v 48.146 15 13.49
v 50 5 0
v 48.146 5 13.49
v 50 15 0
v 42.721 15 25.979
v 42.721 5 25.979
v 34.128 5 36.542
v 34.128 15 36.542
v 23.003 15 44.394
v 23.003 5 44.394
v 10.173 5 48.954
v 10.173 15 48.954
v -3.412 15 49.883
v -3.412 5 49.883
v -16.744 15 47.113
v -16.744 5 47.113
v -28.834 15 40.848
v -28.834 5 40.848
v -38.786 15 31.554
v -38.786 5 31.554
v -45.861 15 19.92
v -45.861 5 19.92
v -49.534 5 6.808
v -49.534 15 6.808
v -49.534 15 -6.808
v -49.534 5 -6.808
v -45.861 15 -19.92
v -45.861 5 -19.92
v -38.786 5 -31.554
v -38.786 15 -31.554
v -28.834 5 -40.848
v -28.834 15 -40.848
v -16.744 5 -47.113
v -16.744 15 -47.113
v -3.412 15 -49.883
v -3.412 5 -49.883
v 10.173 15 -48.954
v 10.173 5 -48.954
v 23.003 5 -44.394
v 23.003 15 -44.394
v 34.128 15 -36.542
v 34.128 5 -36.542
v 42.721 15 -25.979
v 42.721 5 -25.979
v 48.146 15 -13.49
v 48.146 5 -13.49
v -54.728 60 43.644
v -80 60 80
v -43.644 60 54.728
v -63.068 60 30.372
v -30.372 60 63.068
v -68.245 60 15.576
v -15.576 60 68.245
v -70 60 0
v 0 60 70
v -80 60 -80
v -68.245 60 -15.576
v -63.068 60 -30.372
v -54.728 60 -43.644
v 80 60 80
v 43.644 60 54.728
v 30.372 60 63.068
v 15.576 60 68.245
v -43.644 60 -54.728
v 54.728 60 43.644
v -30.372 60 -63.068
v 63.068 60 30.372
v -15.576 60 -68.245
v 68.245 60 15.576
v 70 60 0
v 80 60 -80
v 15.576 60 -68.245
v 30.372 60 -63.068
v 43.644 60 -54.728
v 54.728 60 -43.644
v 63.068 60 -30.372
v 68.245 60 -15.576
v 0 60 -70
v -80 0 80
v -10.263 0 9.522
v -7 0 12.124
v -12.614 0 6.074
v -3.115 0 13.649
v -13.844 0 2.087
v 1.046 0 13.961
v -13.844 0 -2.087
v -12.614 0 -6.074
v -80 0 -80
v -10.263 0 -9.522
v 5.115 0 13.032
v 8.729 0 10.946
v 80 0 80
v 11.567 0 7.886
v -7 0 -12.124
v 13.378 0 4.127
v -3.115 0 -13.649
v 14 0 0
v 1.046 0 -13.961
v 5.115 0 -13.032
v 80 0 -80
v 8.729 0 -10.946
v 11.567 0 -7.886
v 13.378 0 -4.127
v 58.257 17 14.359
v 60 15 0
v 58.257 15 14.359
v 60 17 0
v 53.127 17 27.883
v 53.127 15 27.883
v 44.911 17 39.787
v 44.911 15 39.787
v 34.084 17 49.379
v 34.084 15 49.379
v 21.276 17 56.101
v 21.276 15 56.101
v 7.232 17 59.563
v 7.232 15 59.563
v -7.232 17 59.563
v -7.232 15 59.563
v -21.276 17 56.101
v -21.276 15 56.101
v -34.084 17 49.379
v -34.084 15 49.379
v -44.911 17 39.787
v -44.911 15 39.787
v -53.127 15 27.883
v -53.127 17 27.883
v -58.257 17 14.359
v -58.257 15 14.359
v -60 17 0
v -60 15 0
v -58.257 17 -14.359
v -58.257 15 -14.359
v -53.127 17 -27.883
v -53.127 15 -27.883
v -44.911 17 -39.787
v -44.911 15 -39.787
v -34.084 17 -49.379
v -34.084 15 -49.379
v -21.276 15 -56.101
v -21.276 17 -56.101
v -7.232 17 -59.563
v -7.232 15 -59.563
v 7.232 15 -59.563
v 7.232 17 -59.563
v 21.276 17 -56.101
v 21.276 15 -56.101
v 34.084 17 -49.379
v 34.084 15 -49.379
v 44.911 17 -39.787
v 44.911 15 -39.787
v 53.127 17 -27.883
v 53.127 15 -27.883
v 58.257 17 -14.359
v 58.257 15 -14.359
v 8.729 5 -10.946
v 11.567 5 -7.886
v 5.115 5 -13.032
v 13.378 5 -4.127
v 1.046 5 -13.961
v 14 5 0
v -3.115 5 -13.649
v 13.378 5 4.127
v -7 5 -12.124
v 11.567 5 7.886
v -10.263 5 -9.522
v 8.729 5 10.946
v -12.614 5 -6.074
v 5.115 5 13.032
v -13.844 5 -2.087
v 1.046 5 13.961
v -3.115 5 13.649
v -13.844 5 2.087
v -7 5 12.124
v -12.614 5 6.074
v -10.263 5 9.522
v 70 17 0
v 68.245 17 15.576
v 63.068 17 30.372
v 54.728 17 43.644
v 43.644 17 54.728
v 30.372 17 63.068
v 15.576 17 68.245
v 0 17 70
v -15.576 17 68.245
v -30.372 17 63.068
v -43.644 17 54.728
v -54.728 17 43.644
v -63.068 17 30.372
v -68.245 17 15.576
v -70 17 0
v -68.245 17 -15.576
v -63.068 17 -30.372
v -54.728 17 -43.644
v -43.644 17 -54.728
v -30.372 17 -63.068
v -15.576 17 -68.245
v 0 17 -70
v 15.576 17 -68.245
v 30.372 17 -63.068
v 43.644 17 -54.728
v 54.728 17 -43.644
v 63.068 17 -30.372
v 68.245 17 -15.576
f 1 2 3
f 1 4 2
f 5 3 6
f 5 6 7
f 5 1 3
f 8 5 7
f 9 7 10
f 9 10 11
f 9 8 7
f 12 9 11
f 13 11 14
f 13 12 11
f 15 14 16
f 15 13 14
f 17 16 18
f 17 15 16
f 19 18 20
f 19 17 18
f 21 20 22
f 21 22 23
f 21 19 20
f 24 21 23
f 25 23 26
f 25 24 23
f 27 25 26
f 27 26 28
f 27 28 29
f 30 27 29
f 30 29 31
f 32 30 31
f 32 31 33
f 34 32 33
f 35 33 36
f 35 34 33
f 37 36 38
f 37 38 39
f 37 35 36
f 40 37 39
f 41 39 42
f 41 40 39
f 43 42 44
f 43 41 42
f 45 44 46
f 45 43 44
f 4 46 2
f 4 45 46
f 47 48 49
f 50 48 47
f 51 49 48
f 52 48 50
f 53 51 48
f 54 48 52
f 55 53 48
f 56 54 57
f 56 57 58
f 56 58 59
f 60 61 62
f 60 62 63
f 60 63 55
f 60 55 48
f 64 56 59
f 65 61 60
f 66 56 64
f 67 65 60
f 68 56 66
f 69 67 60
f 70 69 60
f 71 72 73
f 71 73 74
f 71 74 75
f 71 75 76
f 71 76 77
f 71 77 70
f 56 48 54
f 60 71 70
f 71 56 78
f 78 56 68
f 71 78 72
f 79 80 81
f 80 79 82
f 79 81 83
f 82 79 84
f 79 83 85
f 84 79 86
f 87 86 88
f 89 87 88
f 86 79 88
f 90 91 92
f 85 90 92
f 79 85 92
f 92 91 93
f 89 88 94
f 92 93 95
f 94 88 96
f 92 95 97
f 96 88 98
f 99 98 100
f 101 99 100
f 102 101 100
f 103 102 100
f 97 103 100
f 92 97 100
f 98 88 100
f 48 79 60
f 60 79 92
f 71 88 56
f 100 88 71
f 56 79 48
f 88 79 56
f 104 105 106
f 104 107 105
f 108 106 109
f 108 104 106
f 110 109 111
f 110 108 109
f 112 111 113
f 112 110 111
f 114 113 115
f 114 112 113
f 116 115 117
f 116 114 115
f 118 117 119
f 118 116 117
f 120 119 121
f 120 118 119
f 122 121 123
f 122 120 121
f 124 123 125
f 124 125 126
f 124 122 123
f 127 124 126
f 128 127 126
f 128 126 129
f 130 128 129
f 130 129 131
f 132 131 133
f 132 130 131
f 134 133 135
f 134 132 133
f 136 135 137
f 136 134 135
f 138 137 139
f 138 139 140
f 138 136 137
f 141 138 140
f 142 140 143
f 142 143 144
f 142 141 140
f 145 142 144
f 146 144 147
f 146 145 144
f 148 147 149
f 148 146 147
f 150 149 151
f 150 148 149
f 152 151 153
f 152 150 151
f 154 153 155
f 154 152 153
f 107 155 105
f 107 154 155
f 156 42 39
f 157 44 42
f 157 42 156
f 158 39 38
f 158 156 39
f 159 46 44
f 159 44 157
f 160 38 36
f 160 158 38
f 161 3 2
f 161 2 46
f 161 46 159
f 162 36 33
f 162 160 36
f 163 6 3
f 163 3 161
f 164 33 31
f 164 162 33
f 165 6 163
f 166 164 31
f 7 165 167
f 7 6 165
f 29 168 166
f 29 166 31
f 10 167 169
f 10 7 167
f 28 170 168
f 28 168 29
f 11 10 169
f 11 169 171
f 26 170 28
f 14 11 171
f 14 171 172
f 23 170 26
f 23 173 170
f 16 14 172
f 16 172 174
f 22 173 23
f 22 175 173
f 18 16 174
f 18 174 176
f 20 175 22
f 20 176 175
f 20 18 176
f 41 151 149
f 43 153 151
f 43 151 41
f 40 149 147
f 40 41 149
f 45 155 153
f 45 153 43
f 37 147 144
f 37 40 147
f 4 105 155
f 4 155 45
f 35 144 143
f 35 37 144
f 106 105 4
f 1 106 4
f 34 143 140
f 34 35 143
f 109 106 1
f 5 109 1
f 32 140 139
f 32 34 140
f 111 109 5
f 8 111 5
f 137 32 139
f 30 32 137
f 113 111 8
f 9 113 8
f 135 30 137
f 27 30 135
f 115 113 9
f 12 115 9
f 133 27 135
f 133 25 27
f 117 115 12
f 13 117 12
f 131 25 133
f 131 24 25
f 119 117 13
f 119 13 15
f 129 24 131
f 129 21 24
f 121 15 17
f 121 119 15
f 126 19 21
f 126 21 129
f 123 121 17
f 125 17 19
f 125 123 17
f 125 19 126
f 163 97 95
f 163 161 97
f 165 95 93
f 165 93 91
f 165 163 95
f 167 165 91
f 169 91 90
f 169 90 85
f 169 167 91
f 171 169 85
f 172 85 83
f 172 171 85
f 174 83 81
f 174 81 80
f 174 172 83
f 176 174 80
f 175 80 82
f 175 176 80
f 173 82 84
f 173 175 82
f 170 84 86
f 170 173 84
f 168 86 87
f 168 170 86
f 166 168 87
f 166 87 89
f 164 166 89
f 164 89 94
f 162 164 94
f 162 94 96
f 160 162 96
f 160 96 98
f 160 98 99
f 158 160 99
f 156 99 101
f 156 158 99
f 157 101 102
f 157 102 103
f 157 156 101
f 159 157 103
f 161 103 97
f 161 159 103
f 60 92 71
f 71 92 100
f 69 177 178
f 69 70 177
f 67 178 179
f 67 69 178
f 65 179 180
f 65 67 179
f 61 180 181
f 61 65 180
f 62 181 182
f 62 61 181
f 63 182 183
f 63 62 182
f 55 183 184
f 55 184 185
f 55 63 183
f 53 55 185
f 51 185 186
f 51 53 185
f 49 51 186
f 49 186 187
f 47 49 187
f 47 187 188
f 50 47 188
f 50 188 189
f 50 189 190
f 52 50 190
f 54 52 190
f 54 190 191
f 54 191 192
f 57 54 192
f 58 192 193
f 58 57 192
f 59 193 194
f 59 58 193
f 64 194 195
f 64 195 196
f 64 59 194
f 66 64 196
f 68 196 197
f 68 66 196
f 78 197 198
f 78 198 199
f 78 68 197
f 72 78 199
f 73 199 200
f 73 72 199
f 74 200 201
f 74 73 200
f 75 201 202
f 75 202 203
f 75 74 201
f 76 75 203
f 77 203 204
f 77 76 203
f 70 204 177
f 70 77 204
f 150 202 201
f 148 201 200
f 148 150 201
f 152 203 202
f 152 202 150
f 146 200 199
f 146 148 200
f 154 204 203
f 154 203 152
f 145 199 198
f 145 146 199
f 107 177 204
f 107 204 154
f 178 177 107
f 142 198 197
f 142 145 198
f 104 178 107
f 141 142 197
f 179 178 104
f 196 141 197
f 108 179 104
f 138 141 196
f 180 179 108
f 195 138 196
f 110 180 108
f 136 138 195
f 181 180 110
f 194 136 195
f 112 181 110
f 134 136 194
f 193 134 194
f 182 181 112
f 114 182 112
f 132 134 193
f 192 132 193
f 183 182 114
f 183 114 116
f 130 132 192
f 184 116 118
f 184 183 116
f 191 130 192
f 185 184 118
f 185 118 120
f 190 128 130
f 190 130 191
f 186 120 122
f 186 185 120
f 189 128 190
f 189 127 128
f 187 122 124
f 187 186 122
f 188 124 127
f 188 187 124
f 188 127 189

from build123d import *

# Parameters (mm, degrees)
SKETCH_1_W      = 160
SKETCH_1_H      = 160
EXTRUDE_1_DEPTH = 60


with BuildPart() as part:
    # 草圖1 → 填料-伸長1 (new body)
    with BuildSketch(Plane(origin=(0, 0, 0), x_dir=(1, 0, 0), z_dir=(0, 1, 0))):
        Rectangle(SKETCH_1_W, SKETCH_1_H)
    extrude(amount=EXTRUDE_1_DEPTH)

    # 草圖2 → 除料-旋轉1 (revolve, cut)
    with BuildSketch(Plane.XY):
        Polygon((0, 0), (14, 0), (14, 5), (50, 5), (50, 15), (60, 15), (60, 17), (70, 17), (70, 60), (0, 60), align=None)
    revolve(axis=Axis((0, 77.889426339, 0), (0, -1, 0)), mode=Mode.SUBTRACT)


solid = part.part
